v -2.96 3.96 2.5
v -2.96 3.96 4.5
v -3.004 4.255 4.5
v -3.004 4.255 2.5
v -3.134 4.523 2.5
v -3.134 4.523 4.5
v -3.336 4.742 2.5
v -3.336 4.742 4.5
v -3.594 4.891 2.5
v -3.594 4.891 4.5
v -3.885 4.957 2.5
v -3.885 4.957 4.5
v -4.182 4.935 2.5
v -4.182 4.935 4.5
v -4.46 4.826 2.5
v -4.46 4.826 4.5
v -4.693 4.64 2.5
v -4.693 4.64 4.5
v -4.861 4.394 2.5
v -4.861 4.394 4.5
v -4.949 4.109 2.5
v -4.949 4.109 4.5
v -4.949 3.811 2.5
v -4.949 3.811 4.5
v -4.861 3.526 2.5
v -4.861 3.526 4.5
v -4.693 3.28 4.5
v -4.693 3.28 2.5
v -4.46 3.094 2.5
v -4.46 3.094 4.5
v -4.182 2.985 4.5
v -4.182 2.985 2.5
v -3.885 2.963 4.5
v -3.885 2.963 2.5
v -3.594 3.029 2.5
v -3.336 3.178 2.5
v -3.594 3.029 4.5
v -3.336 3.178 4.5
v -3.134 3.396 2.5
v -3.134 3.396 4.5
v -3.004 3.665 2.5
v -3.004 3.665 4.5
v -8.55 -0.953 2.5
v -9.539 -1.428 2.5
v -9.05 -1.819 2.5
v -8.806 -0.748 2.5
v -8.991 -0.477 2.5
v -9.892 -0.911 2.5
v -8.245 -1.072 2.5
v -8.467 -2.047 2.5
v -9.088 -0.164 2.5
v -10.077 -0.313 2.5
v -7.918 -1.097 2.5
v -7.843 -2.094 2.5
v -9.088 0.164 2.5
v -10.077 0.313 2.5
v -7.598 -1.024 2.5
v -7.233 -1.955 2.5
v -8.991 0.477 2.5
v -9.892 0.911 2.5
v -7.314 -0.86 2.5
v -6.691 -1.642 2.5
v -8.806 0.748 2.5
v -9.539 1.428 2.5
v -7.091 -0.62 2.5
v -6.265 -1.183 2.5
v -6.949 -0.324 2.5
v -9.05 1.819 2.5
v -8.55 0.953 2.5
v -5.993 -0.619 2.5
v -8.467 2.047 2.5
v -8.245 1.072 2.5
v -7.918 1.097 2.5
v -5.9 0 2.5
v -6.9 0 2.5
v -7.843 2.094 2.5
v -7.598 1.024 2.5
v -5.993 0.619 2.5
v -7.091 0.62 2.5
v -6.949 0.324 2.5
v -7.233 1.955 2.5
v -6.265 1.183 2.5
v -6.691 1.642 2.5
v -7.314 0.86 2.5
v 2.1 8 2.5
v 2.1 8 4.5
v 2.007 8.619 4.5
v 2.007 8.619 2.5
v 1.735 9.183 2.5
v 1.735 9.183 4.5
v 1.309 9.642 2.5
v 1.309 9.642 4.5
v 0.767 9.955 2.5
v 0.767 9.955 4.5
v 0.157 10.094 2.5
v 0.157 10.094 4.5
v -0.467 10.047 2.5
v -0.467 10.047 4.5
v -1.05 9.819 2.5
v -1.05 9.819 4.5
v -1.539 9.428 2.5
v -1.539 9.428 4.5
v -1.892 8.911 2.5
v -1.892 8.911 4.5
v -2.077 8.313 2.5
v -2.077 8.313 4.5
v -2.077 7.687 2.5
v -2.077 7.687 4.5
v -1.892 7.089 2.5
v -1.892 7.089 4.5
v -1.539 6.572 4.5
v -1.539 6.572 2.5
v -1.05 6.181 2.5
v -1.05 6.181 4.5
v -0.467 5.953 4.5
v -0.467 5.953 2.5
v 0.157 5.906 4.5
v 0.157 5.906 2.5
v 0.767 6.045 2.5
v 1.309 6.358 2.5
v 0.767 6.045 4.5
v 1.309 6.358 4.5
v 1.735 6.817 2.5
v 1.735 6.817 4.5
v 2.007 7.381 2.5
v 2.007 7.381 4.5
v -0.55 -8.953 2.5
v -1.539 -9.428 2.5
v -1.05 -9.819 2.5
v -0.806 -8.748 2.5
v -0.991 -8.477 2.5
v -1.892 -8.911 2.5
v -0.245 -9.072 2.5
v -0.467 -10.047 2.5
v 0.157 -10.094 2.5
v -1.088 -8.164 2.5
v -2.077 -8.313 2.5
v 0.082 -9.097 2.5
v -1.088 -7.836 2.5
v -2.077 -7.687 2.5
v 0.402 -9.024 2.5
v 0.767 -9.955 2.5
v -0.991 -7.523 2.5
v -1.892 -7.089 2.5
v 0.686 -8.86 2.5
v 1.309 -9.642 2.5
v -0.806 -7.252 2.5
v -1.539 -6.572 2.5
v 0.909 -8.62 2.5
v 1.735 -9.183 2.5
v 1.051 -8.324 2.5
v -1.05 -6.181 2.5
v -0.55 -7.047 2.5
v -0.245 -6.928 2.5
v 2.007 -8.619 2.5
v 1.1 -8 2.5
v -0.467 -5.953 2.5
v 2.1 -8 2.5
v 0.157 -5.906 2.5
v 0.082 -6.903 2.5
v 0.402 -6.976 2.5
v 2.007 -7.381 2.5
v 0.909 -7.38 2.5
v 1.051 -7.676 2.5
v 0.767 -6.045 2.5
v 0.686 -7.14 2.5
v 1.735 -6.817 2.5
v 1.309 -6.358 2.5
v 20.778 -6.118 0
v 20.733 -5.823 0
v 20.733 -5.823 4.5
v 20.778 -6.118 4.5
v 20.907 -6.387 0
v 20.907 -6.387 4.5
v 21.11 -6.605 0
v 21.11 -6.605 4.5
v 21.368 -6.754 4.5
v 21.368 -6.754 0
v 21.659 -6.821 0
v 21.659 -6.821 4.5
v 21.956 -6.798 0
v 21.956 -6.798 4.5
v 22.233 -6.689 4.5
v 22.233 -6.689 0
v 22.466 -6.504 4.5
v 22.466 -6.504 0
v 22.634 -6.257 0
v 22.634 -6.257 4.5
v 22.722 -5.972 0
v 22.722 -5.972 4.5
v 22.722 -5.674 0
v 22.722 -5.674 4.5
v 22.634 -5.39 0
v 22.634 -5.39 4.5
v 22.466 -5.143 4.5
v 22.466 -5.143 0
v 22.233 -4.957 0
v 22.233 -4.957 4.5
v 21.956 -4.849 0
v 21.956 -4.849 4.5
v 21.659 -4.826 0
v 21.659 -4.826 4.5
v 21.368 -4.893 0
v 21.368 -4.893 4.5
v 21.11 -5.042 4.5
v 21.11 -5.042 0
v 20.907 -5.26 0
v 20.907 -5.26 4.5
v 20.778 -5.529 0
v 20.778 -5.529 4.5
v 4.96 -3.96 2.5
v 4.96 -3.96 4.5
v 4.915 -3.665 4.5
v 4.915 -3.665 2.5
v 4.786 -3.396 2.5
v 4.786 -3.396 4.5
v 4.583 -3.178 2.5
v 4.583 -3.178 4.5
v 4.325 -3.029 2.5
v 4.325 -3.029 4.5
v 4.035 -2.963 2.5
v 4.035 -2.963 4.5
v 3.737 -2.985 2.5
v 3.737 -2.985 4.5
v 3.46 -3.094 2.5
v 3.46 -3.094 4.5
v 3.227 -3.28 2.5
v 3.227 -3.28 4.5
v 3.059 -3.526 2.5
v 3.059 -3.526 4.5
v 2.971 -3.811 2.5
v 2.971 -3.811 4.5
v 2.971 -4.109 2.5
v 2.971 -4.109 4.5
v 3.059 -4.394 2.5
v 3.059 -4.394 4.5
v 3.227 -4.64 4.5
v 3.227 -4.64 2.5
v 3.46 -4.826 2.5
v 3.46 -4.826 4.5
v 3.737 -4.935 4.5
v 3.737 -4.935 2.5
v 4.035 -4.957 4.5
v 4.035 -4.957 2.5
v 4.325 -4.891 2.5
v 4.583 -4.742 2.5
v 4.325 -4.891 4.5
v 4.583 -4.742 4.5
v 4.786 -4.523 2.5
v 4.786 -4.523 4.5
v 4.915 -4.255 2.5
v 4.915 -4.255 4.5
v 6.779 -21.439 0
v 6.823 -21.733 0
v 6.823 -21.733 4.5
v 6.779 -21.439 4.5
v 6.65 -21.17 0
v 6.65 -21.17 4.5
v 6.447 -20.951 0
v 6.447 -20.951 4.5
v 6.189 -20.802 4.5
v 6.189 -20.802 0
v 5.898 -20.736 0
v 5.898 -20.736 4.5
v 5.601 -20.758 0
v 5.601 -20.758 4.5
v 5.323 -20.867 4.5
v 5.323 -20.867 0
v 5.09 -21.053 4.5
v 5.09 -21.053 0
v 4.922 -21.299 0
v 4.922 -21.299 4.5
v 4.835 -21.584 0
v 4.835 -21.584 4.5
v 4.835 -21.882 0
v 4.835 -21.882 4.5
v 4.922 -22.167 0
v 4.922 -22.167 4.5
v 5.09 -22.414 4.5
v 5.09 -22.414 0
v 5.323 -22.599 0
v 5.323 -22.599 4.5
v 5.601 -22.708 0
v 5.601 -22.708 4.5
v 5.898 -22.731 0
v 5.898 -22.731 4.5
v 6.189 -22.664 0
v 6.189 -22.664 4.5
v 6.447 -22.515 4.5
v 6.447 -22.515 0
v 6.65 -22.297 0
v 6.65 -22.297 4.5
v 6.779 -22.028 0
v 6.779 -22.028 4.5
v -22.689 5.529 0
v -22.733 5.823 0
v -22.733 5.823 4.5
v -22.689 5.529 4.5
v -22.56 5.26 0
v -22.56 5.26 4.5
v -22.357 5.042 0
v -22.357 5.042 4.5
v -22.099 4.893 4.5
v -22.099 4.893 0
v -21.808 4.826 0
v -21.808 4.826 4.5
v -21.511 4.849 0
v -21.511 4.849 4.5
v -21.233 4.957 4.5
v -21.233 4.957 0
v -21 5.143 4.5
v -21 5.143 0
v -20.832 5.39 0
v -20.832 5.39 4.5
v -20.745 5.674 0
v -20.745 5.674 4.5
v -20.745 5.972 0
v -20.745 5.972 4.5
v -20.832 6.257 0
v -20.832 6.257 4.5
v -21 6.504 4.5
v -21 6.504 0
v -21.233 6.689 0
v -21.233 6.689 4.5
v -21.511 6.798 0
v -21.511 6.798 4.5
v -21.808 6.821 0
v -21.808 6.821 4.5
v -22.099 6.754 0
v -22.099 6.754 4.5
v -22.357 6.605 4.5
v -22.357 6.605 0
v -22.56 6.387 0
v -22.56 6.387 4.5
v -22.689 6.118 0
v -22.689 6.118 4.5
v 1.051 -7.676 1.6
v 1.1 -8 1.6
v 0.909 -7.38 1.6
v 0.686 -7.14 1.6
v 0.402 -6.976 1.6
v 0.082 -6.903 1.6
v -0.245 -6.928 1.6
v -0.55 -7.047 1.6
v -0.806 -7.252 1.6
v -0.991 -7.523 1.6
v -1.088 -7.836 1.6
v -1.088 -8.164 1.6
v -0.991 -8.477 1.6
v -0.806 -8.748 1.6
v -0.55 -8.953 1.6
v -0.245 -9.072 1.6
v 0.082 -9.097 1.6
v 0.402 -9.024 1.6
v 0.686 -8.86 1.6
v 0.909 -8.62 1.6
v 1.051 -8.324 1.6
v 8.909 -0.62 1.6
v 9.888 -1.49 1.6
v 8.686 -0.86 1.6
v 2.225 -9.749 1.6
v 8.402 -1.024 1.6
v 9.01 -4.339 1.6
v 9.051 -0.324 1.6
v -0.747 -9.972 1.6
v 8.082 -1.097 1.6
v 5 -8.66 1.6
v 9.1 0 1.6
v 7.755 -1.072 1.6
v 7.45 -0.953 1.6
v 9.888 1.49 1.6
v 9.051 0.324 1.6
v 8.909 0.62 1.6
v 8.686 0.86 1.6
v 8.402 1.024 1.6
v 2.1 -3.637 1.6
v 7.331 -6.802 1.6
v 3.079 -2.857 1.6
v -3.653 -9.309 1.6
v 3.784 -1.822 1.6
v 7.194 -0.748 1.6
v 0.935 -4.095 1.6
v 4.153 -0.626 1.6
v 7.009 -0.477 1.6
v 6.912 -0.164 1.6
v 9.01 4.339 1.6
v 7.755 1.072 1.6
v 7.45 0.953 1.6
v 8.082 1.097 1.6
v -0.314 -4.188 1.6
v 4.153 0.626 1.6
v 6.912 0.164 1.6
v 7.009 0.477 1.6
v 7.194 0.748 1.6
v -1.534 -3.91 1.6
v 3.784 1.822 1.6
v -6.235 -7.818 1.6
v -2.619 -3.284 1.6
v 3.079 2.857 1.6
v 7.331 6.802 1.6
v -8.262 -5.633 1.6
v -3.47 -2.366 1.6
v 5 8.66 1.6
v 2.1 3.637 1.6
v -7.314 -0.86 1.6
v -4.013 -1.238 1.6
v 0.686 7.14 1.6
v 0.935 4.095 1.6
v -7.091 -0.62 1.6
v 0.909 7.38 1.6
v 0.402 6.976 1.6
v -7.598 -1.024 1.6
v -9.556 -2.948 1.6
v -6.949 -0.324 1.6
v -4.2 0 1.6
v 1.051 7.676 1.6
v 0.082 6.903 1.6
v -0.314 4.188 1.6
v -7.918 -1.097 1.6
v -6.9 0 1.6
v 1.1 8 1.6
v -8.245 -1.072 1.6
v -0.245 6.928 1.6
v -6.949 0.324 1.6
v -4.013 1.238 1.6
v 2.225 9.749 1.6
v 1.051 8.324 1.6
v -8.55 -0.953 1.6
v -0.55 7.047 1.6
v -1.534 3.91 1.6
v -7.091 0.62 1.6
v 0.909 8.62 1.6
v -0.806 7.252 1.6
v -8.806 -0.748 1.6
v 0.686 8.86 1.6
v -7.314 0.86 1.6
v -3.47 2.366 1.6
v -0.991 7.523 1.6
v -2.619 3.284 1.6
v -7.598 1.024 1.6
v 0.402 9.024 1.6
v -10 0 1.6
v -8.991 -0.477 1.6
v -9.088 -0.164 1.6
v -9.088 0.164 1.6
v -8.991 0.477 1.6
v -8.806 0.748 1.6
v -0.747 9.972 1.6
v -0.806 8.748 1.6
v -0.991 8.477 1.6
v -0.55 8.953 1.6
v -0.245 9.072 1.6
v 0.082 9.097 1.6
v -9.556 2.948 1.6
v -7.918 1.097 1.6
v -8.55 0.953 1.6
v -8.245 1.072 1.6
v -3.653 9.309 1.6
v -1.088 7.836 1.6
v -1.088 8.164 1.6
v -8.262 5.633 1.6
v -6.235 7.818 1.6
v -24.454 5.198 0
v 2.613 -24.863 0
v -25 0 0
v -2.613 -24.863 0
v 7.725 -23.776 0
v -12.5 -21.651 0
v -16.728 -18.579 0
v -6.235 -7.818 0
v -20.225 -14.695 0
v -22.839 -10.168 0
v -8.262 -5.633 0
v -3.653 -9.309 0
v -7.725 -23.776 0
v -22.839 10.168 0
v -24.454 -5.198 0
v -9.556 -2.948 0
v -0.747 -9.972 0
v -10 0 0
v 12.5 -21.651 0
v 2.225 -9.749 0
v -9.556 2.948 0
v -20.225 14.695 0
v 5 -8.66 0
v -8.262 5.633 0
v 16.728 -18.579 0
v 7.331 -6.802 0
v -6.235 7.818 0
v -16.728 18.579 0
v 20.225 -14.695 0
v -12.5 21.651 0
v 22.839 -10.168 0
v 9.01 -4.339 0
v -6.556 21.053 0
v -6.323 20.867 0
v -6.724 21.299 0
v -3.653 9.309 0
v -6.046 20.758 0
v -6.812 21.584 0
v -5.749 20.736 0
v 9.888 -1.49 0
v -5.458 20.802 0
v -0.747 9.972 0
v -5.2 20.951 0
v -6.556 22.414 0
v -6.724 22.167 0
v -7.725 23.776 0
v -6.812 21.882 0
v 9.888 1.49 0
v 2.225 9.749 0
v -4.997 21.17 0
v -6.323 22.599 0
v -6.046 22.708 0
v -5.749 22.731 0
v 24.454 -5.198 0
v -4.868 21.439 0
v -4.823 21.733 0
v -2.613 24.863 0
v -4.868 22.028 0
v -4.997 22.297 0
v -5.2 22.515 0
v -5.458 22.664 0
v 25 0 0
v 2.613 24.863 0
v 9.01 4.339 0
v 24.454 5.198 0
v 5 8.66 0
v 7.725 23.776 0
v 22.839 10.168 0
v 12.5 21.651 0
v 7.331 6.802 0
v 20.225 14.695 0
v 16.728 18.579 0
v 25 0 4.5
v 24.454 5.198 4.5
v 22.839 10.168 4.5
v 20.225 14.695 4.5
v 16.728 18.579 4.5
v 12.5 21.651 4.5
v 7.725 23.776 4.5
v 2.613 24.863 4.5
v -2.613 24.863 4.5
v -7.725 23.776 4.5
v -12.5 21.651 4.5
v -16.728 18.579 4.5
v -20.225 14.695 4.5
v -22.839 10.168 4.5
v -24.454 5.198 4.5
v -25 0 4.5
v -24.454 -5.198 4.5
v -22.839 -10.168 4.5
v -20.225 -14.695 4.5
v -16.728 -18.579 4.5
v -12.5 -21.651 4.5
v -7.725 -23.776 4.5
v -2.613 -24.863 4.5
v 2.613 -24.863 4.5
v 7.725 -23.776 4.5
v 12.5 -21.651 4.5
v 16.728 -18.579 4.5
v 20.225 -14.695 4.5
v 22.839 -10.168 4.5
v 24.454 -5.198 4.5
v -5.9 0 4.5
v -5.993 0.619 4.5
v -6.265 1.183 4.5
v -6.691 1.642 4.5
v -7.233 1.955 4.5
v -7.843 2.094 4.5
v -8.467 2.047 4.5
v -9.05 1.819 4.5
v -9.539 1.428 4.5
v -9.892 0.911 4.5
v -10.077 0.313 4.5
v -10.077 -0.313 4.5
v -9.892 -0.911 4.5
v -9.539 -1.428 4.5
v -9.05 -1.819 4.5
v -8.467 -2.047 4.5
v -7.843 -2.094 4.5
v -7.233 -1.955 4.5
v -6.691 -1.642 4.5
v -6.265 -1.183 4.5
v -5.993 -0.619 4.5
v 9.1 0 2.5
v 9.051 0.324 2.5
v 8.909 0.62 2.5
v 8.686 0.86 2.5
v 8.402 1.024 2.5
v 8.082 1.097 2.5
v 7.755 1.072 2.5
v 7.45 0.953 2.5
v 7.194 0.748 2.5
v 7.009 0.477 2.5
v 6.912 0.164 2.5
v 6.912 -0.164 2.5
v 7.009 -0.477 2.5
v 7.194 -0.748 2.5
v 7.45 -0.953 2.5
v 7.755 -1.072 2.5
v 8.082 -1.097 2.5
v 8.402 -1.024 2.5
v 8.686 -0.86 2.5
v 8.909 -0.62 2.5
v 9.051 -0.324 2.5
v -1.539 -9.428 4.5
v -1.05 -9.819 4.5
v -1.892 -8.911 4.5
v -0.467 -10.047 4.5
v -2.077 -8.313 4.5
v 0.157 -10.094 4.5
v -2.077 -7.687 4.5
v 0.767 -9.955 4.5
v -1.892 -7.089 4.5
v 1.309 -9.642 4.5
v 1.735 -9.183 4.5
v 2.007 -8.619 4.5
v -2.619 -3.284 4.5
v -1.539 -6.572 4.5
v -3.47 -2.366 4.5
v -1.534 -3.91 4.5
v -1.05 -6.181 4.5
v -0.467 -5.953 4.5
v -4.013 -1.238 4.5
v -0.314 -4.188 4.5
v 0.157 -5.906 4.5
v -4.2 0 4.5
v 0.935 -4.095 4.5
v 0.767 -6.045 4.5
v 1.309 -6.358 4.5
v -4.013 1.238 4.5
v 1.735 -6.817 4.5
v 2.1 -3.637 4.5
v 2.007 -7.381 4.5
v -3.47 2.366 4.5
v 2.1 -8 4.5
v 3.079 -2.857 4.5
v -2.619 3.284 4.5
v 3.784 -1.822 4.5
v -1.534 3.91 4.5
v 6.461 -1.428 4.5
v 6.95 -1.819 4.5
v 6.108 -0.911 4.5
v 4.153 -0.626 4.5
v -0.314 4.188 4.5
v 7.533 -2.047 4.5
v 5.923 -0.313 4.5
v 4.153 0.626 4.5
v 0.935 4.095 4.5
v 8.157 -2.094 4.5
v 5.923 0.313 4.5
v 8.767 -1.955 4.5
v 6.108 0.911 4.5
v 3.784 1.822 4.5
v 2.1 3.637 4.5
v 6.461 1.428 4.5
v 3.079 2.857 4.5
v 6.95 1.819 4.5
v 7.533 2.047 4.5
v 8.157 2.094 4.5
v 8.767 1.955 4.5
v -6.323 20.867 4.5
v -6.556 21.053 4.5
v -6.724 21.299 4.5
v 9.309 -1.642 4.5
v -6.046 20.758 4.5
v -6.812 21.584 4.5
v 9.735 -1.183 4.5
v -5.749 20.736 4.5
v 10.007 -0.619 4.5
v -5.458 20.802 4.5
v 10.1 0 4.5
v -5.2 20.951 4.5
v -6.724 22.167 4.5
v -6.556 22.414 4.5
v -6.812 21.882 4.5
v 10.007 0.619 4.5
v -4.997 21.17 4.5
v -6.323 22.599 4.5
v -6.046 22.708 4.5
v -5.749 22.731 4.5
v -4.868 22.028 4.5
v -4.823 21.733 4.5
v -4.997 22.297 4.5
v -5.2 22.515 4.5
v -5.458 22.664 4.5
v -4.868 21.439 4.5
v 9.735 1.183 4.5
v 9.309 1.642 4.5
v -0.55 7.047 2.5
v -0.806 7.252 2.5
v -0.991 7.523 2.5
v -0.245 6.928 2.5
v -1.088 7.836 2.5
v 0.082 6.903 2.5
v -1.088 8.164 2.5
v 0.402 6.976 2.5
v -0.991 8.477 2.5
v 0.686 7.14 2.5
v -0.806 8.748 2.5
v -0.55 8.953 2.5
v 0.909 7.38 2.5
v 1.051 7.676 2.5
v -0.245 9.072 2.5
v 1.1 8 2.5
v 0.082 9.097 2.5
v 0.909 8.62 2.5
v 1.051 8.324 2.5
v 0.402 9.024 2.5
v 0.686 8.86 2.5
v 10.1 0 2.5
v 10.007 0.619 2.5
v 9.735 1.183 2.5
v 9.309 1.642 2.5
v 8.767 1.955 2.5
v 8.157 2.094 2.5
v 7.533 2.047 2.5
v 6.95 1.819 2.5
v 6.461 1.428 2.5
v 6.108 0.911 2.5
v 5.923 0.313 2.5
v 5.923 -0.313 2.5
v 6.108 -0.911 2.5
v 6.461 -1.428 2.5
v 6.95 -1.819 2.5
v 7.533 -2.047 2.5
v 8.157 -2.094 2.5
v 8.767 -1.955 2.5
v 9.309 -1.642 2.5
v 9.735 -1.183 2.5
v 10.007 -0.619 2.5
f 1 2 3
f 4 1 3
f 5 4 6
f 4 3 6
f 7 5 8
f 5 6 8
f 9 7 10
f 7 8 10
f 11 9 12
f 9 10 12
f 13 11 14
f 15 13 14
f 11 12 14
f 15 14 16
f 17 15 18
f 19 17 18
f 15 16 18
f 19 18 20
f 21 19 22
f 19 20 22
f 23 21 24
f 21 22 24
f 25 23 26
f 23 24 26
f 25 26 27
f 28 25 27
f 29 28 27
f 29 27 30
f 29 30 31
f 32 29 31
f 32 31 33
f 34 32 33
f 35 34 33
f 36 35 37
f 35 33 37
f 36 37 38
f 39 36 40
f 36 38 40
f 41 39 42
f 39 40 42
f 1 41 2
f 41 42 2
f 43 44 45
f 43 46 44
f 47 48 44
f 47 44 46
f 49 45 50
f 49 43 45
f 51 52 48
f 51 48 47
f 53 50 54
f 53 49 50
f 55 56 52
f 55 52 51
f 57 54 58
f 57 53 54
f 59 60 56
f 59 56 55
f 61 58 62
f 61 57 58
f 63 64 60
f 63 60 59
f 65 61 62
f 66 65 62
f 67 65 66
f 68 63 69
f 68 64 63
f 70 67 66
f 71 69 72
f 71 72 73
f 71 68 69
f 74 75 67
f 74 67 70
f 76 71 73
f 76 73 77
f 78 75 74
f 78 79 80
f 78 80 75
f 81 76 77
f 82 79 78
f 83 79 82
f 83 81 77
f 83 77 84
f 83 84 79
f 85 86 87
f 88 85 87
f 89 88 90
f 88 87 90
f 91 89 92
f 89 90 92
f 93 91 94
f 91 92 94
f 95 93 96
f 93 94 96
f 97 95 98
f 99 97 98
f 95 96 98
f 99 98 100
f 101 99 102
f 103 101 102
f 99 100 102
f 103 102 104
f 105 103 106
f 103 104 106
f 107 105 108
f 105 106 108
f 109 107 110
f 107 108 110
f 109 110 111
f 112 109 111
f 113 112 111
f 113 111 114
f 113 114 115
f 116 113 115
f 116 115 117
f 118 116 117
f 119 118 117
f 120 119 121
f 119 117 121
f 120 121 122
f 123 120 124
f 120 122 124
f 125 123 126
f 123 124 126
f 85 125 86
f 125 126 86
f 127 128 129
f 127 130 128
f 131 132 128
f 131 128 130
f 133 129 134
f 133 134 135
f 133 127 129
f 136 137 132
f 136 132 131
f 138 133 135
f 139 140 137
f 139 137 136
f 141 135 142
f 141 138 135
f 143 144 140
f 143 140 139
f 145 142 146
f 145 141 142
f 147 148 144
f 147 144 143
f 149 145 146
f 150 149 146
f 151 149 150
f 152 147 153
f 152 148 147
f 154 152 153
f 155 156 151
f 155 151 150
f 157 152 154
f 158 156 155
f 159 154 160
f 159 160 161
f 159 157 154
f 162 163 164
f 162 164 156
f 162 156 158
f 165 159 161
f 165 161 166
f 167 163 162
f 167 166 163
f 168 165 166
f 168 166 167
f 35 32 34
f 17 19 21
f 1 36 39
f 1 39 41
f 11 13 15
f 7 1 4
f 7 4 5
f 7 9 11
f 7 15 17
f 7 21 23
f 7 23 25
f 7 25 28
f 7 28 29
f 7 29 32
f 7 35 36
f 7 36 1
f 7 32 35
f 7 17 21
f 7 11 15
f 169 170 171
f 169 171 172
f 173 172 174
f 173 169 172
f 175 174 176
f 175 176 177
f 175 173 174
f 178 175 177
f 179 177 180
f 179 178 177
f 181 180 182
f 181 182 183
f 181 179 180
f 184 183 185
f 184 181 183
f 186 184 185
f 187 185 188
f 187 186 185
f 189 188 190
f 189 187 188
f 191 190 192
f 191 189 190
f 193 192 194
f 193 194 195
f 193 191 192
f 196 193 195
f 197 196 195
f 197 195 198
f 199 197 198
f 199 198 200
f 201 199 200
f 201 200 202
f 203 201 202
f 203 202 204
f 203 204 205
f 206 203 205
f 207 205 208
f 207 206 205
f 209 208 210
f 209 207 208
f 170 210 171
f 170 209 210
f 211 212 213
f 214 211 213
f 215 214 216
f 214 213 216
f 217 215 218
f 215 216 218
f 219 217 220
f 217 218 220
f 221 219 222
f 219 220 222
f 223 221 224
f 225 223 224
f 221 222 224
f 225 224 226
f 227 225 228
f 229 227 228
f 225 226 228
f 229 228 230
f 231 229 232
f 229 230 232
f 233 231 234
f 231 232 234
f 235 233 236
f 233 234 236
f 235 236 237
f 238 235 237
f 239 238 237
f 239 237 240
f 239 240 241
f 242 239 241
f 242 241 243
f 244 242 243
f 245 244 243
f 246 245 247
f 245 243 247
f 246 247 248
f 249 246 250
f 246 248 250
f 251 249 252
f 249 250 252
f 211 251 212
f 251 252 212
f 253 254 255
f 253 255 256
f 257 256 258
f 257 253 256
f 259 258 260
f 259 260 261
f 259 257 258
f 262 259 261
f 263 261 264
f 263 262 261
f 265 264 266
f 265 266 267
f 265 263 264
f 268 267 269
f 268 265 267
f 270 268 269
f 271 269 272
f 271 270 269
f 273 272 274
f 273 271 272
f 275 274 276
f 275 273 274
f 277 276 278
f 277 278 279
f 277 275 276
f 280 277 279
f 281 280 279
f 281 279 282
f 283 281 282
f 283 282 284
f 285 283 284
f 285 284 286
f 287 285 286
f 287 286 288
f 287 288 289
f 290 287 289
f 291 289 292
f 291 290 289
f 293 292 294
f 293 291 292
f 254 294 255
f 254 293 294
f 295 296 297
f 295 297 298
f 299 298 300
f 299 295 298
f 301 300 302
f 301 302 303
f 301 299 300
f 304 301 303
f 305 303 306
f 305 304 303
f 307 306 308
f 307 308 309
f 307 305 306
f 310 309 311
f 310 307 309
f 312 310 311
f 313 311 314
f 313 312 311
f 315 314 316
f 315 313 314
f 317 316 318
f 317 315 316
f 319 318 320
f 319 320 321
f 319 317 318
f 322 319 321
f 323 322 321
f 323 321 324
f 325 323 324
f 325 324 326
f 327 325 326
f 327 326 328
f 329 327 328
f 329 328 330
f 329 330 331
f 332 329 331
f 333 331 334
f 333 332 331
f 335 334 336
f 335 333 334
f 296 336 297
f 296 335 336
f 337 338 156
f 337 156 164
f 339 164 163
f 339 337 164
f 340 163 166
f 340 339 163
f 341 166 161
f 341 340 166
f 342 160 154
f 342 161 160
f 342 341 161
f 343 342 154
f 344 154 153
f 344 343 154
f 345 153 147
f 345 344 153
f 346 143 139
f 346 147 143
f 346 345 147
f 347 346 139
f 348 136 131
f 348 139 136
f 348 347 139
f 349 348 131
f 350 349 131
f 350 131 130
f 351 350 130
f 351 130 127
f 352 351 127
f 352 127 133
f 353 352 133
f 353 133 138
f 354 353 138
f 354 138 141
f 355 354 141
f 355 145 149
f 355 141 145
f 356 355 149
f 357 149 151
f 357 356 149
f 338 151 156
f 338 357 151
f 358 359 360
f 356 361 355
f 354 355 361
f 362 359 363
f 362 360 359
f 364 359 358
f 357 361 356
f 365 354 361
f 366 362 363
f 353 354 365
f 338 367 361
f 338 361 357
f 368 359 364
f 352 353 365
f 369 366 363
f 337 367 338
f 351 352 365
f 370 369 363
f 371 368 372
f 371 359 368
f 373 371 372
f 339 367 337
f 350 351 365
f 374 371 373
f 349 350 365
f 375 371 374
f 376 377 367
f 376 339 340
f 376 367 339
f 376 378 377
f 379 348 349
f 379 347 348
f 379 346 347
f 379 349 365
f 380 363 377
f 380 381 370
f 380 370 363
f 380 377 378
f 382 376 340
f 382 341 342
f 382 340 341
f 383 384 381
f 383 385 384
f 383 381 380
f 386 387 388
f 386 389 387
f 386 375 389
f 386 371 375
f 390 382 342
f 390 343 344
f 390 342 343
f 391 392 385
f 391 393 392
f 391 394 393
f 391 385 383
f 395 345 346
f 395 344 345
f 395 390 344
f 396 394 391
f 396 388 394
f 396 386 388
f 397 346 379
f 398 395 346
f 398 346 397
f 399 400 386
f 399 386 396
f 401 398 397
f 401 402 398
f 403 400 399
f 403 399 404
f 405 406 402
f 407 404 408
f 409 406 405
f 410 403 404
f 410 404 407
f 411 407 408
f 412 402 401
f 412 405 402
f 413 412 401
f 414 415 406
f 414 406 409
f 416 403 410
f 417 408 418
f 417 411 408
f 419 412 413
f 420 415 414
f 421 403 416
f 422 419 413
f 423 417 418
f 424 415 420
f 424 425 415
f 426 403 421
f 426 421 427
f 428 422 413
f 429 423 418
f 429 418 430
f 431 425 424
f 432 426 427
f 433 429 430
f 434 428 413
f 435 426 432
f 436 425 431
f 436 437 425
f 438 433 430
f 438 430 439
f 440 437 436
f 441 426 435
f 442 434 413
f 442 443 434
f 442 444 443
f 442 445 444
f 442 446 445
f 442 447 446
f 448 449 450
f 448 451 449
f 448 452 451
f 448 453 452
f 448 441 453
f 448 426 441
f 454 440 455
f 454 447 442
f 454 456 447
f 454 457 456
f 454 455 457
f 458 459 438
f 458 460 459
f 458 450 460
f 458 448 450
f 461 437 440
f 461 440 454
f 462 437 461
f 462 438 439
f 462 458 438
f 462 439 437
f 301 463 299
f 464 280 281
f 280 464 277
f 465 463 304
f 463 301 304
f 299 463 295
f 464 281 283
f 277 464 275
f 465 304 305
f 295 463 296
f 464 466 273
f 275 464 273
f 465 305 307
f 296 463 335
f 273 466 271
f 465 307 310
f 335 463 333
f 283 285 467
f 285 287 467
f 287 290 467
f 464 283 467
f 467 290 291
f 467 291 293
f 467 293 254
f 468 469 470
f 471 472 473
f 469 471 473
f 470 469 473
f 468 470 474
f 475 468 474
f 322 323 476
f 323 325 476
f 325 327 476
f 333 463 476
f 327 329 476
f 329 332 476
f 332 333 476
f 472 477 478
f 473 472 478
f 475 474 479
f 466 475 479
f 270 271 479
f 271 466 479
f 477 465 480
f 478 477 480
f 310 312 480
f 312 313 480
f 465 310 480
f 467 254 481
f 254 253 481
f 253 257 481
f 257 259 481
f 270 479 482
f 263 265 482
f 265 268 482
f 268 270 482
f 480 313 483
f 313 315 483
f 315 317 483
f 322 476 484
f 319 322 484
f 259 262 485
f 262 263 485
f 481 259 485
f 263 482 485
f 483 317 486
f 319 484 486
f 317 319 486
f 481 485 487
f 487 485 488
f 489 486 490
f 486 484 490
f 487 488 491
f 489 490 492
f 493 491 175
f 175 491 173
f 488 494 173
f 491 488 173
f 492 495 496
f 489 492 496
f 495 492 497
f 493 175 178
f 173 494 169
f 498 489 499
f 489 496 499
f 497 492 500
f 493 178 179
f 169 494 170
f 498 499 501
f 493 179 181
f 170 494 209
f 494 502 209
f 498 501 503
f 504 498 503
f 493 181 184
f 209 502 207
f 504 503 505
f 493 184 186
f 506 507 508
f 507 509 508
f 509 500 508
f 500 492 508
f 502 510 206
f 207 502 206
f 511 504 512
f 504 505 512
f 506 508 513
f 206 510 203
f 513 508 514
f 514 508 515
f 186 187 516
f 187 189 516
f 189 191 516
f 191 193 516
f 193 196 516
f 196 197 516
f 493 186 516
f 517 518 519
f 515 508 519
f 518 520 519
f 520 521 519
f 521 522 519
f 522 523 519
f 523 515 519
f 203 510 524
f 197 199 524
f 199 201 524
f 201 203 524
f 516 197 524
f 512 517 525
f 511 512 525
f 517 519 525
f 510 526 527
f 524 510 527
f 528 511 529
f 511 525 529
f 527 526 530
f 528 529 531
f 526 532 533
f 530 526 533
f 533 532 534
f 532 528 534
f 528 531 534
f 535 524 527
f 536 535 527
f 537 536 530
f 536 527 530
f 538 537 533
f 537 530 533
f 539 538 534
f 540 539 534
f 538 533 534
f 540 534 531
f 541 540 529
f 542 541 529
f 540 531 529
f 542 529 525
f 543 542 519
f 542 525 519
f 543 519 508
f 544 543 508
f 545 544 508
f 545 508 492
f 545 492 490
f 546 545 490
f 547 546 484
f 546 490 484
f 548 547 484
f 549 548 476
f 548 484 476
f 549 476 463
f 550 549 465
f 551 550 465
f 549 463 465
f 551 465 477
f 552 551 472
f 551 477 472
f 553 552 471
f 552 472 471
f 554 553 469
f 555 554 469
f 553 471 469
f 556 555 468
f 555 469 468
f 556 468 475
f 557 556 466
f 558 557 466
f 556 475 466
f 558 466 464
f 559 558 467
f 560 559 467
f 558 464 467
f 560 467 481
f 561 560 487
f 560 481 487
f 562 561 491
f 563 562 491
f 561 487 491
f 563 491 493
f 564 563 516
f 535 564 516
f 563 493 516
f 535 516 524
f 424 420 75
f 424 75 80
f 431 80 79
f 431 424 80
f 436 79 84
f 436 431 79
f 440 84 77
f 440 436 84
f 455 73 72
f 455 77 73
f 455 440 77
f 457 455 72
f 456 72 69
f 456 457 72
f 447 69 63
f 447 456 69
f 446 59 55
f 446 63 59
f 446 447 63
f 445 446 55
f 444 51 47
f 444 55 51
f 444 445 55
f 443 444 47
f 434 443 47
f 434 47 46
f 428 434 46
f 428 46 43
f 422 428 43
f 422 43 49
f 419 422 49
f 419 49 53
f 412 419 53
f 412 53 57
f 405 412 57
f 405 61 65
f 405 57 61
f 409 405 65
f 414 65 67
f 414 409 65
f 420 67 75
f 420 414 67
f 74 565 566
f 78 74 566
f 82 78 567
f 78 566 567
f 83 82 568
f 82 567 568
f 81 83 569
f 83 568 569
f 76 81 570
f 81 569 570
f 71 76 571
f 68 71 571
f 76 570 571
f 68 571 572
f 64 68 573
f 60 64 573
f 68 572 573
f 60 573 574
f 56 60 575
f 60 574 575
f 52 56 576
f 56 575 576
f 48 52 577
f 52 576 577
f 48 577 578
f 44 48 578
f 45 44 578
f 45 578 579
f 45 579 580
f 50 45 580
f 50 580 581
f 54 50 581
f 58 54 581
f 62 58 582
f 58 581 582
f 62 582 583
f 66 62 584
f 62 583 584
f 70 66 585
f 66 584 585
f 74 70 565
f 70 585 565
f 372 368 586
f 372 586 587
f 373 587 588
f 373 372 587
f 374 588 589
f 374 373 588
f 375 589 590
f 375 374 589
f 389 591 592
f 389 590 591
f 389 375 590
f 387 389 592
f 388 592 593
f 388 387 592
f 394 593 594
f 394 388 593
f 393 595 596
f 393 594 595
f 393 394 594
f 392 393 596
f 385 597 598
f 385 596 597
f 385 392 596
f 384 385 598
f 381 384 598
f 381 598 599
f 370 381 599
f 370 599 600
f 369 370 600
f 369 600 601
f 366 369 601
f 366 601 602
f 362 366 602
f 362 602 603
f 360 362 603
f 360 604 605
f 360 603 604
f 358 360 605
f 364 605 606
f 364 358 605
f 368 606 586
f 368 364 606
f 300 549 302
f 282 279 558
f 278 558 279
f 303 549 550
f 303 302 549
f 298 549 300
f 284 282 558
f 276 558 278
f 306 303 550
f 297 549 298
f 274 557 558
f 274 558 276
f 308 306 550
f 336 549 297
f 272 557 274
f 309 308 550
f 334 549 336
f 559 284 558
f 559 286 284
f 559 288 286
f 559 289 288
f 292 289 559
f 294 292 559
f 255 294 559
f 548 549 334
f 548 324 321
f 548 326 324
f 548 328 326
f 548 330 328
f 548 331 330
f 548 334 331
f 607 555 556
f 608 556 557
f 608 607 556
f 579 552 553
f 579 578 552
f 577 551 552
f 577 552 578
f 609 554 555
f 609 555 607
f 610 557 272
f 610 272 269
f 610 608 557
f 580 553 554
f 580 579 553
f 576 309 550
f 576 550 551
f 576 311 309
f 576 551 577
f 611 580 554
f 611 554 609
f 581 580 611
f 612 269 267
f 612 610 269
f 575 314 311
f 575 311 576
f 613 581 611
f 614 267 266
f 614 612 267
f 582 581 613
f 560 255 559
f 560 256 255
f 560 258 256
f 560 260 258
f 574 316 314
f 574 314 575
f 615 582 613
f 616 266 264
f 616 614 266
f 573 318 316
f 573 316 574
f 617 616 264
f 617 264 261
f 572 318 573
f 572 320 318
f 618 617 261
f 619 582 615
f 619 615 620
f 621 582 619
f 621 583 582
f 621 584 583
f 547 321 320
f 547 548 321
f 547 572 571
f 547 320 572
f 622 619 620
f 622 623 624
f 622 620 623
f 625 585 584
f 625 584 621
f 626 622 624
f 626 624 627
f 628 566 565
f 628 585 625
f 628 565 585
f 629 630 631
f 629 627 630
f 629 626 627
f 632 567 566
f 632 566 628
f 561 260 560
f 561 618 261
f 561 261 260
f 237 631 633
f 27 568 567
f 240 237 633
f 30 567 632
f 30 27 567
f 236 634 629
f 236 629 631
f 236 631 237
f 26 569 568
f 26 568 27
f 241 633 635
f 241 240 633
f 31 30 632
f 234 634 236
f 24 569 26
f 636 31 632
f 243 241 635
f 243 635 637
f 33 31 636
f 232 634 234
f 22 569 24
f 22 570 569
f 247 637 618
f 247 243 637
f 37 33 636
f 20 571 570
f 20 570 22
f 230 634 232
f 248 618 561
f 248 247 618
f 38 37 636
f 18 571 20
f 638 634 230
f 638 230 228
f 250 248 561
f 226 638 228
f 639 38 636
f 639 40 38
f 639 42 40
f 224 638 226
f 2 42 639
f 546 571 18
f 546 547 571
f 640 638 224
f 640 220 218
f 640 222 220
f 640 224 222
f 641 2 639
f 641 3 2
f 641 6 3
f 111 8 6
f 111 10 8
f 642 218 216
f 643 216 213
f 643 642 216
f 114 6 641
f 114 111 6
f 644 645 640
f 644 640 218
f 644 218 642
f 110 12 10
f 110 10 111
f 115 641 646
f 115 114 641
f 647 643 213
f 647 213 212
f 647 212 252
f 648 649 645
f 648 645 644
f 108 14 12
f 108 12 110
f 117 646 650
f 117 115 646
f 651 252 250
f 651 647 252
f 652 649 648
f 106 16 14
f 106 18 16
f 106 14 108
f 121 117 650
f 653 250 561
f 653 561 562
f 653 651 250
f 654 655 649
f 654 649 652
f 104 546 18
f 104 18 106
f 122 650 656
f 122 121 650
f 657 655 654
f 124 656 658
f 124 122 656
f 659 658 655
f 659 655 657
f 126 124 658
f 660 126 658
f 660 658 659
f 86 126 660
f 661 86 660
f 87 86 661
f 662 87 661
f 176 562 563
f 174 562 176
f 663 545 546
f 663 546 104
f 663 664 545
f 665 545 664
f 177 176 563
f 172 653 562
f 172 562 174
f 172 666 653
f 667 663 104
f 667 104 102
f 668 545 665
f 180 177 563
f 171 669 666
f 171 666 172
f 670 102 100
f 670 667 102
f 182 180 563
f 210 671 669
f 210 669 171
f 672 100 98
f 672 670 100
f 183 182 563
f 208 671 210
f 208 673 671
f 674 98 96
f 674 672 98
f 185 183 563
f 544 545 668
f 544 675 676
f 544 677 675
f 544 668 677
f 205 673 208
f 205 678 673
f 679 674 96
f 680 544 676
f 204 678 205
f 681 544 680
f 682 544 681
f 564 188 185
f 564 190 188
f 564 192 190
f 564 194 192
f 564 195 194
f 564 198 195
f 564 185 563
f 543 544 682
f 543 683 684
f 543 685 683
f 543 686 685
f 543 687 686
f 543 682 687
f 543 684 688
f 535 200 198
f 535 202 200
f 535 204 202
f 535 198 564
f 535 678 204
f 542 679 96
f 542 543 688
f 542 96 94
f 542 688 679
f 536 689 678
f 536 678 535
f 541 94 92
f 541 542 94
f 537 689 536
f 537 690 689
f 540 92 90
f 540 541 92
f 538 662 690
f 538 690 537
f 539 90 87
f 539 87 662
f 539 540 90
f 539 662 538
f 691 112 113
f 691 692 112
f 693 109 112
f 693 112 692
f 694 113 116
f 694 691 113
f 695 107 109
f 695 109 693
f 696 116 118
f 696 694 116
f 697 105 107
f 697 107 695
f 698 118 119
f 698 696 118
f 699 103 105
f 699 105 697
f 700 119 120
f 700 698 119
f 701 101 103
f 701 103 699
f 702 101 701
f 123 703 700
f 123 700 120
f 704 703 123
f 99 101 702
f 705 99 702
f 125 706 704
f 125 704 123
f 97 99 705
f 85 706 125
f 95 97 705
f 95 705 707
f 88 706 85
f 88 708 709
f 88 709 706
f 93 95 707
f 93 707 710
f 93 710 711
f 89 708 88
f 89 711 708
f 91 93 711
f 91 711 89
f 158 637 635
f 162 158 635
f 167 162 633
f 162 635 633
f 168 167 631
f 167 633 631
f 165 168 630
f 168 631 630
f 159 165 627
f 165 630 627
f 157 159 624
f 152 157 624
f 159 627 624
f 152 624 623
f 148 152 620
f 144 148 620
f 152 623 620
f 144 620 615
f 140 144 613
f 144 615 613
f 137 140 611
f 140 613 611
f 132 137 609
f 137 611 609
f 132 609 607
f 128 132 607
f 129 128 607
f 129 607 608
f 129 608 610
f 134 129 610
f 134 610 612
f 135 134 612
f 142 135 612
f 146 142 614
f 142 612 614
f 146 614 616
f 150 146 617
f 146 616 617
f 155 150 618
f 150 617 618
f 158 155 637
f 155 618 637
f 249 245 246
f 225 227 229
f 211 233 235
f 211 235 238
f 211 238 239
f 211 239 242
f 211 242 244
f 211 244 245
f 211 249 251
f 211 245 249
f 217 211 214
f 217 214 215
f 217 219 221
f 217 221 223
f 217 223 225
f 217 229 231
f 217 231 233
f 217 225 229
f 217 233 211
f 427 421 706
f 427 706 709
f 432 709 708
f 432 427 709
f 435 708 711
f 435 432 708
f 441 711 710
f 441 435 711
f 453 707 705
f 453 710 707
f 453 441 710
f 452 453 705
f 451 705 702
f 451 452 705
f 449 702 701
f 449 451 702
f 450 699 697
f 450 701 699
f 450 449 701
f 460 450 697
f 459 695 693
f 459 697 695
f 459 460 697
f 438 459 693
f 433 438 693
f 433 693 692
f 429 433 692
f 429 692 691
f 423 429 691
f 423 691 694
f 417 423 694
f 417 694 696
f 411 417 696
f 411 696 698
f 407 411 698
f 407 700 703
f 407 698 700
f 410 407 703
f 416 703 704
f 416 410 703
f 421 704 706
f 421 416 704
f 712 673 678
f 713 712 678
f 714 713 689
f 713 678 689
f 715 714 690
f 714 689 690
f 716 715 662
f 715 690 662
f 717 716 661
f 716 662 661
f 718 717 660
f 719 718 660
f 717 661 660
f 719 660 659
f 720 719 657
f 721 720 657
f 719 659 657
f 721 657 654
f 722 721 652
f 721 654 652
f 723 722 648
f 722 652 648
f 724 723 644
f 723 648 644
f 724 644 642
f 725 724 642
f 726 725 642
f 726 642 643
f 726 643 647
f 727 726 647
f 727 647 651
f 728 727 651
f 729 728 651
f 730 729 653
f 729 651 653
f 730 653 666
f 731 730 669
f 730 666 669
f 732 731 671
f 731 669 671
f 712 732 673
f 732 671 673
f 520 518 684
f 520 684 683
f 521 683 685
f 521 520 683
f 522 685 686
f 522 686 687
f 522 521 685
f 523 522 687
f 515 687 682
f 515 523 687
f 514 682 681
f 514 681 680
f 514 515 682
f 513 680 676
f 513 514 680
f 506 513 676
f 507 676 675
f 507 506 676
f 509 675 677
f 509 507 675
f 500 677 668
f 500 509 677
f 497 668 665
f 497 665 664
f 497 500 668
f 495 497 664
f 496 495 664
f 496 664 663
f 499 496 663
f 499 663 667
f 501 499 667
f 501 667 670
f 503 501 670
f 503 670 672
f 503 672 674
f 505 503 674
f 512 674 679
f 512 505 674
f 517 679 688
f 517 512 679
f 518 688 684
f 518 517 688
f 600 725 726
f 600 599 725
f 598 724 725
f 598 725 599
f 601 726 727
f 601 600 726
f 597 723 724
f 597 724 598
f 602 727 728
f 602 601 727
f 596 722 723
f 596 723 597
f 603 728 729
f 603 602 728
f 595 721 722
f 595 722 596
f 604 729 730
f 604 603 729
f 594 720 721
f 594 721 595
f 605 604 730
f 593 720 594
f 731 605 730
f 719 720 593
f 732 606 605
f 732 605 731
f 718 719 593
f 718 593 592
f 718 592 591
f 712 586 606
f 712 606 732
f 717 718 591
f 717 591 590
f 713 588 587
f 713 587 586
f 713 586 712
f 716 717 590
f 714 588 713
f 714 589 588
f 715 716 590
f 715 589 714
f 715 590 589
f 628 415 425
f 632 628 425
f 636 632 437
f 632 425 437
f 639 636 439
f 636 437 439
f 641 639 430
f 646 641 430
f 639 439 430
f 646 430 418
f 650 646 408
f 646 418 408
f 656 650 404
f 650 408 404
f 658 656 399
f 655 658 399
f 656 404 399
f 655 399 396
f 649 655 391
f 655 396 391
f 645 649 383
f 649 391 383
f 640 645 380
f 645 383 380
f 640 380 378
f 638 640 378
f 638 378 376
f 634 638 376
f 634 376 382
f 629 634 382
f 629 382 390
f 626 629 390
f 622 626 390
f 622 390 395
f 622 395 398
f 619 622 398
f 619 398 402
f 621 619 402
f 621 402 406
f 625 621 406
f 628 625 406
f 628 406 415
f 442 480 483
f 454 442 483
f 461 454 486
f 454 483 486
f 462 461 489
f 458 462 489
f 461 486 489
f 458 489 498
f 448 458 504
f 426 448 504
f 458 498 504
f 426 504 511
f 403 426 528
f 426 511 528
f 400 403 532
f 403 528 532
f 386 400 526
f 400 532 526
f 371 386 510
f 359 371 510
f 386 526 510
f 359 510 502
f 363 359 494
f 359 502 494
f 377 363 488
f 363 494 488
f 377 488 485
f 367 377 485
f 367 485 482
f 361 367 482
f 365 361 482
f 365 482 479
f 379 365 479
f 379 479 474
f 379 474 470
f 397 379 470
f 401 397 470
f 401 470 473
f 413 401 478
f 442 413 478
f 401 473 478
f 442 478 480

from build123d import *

# Parameters (mm, degrees)
SKETCH_1_R          = 25
SKETCH_1_R_2        = 2.3
SKETCH_1_R_3        = 1.1
SKETCH_1_R_4        = 1
EXTRUDE_1_DEPTH     = 4.5
SKETCH_2_R          = 2.1
CUT_EXTRUDE_1_DEPTH = 2
SKETCH_10_R         = 10
CUT_EXTRUDE_7_DEPTH = 1.6
SKETCH_9_R          = 4.2
CUT_EXTRUDE_5_DEPTH = 36.474075041
SKETCH_6_R          = 1
CUT_EXTRUDE_6_DEPTH = 2


with BuildPart() as part:
    # 스케치1 → 보스-돌출1 (new body)
    with BuildSketch(Plane.XY):
        Circle(SKETCH_1_R)
        Circle(SKETCH_1_R_2, mode=Mode.SUBTRACT)
        with Locations((0, 8)):
            Circle(SKETCH_1_R_3, mode=Mode.SUBTRACT)
        with Locations((8, 0)):
            Circle(SKETCH_1_R_3, mode=Mode.SUBTRACT)
        with Locations((0, -8)):
            Circle(SKETCH_1_R_3, mode=Mode.SUBTRACT)
        with Locations((-8, 0)):
            Circle(SKETCH_1_R_3, mode=Mode.SUBTRACT)
        with Locations((-5.823428515, 21.733331092)):
            Circle(SKETCH_1_R_4, mode=Mode.SUBTRACT)
        with Locations(Location((21.733331092, -5.823428515, 0), (0, 0, 180))):
            Circle(SKETCH_1_R_4, mode=Mode.SUBTRACT)
        with Locations((5.823428515, -21.733331092)):
            Circle(SKETCH_1_R_4, mode=Mode.SUBTRACT)
        with Locations(Location((-21.733331092, 5.823428515, 0), (0, 0, 180))):
            Circle(SKETCH_1_R_4, mode=Mode.SUBTRACT)
    extrude(amount=EXTRUDE_1_DEPTH)

    # 스케치2 → 컷-돌출1 (cut)
    with BuildSketch(Plane.XY.offset(4.5)):
        with Locations((0, 8)):
            Circle(SKETCH_2_R)
        with Locations((8, 0)):
            Circle(SKETCH_2_R)
        with Locations((0, -8)):
            Circle(SKETCH_2_R)
        with Locations((-8, 0)):
            Circle(SKETCH_2_R)
    extrude(amount=-CUT_EXTRUDE_1_DEPTH, mode=Mode.SUBTRACT)

    # 스케치10 → 컷-돌출7 (cut)
    with BuildSketch(Plane(origin=(0, 0, 0), x_dir=(-1, 0, 0), z_dir=(0, 0, -1))):
        Circle(SKETCH_10_R)
    extrude(amount=-CUT_EXTRUDE_7_DEPTH, mode=Mode.SUBTRACT)

    # 스케치9 → 컷-돌출5 (cut, through all)
    with BuildSketch(Plane(origin=(0, 0, 1.6), x_dir=(-1, 0, 0), z_dir=(0, 0, -1))):
        Circle(SKETCH_9_R)
    extrude(amount=-CUT_EXTRUDE_5_DEPTH, mode=Mode.SUBTRACT)

    # 스케치6 → 컷-돌출6 (cut)
    with BuildSketch(Plane.XY.offset(4.5)):
        with Locations((-3.959797975, 3.959797975)):
            Circle(SKETCH_6_R)
        with Locations((3.959797975, -3.959797975)):
            Circle(SKETCH_6_R)
    extrude(amount=-CUT_EXTRUDE_6_DEPTH, mode=Mode.SUBTRACT)


solid = part.part
